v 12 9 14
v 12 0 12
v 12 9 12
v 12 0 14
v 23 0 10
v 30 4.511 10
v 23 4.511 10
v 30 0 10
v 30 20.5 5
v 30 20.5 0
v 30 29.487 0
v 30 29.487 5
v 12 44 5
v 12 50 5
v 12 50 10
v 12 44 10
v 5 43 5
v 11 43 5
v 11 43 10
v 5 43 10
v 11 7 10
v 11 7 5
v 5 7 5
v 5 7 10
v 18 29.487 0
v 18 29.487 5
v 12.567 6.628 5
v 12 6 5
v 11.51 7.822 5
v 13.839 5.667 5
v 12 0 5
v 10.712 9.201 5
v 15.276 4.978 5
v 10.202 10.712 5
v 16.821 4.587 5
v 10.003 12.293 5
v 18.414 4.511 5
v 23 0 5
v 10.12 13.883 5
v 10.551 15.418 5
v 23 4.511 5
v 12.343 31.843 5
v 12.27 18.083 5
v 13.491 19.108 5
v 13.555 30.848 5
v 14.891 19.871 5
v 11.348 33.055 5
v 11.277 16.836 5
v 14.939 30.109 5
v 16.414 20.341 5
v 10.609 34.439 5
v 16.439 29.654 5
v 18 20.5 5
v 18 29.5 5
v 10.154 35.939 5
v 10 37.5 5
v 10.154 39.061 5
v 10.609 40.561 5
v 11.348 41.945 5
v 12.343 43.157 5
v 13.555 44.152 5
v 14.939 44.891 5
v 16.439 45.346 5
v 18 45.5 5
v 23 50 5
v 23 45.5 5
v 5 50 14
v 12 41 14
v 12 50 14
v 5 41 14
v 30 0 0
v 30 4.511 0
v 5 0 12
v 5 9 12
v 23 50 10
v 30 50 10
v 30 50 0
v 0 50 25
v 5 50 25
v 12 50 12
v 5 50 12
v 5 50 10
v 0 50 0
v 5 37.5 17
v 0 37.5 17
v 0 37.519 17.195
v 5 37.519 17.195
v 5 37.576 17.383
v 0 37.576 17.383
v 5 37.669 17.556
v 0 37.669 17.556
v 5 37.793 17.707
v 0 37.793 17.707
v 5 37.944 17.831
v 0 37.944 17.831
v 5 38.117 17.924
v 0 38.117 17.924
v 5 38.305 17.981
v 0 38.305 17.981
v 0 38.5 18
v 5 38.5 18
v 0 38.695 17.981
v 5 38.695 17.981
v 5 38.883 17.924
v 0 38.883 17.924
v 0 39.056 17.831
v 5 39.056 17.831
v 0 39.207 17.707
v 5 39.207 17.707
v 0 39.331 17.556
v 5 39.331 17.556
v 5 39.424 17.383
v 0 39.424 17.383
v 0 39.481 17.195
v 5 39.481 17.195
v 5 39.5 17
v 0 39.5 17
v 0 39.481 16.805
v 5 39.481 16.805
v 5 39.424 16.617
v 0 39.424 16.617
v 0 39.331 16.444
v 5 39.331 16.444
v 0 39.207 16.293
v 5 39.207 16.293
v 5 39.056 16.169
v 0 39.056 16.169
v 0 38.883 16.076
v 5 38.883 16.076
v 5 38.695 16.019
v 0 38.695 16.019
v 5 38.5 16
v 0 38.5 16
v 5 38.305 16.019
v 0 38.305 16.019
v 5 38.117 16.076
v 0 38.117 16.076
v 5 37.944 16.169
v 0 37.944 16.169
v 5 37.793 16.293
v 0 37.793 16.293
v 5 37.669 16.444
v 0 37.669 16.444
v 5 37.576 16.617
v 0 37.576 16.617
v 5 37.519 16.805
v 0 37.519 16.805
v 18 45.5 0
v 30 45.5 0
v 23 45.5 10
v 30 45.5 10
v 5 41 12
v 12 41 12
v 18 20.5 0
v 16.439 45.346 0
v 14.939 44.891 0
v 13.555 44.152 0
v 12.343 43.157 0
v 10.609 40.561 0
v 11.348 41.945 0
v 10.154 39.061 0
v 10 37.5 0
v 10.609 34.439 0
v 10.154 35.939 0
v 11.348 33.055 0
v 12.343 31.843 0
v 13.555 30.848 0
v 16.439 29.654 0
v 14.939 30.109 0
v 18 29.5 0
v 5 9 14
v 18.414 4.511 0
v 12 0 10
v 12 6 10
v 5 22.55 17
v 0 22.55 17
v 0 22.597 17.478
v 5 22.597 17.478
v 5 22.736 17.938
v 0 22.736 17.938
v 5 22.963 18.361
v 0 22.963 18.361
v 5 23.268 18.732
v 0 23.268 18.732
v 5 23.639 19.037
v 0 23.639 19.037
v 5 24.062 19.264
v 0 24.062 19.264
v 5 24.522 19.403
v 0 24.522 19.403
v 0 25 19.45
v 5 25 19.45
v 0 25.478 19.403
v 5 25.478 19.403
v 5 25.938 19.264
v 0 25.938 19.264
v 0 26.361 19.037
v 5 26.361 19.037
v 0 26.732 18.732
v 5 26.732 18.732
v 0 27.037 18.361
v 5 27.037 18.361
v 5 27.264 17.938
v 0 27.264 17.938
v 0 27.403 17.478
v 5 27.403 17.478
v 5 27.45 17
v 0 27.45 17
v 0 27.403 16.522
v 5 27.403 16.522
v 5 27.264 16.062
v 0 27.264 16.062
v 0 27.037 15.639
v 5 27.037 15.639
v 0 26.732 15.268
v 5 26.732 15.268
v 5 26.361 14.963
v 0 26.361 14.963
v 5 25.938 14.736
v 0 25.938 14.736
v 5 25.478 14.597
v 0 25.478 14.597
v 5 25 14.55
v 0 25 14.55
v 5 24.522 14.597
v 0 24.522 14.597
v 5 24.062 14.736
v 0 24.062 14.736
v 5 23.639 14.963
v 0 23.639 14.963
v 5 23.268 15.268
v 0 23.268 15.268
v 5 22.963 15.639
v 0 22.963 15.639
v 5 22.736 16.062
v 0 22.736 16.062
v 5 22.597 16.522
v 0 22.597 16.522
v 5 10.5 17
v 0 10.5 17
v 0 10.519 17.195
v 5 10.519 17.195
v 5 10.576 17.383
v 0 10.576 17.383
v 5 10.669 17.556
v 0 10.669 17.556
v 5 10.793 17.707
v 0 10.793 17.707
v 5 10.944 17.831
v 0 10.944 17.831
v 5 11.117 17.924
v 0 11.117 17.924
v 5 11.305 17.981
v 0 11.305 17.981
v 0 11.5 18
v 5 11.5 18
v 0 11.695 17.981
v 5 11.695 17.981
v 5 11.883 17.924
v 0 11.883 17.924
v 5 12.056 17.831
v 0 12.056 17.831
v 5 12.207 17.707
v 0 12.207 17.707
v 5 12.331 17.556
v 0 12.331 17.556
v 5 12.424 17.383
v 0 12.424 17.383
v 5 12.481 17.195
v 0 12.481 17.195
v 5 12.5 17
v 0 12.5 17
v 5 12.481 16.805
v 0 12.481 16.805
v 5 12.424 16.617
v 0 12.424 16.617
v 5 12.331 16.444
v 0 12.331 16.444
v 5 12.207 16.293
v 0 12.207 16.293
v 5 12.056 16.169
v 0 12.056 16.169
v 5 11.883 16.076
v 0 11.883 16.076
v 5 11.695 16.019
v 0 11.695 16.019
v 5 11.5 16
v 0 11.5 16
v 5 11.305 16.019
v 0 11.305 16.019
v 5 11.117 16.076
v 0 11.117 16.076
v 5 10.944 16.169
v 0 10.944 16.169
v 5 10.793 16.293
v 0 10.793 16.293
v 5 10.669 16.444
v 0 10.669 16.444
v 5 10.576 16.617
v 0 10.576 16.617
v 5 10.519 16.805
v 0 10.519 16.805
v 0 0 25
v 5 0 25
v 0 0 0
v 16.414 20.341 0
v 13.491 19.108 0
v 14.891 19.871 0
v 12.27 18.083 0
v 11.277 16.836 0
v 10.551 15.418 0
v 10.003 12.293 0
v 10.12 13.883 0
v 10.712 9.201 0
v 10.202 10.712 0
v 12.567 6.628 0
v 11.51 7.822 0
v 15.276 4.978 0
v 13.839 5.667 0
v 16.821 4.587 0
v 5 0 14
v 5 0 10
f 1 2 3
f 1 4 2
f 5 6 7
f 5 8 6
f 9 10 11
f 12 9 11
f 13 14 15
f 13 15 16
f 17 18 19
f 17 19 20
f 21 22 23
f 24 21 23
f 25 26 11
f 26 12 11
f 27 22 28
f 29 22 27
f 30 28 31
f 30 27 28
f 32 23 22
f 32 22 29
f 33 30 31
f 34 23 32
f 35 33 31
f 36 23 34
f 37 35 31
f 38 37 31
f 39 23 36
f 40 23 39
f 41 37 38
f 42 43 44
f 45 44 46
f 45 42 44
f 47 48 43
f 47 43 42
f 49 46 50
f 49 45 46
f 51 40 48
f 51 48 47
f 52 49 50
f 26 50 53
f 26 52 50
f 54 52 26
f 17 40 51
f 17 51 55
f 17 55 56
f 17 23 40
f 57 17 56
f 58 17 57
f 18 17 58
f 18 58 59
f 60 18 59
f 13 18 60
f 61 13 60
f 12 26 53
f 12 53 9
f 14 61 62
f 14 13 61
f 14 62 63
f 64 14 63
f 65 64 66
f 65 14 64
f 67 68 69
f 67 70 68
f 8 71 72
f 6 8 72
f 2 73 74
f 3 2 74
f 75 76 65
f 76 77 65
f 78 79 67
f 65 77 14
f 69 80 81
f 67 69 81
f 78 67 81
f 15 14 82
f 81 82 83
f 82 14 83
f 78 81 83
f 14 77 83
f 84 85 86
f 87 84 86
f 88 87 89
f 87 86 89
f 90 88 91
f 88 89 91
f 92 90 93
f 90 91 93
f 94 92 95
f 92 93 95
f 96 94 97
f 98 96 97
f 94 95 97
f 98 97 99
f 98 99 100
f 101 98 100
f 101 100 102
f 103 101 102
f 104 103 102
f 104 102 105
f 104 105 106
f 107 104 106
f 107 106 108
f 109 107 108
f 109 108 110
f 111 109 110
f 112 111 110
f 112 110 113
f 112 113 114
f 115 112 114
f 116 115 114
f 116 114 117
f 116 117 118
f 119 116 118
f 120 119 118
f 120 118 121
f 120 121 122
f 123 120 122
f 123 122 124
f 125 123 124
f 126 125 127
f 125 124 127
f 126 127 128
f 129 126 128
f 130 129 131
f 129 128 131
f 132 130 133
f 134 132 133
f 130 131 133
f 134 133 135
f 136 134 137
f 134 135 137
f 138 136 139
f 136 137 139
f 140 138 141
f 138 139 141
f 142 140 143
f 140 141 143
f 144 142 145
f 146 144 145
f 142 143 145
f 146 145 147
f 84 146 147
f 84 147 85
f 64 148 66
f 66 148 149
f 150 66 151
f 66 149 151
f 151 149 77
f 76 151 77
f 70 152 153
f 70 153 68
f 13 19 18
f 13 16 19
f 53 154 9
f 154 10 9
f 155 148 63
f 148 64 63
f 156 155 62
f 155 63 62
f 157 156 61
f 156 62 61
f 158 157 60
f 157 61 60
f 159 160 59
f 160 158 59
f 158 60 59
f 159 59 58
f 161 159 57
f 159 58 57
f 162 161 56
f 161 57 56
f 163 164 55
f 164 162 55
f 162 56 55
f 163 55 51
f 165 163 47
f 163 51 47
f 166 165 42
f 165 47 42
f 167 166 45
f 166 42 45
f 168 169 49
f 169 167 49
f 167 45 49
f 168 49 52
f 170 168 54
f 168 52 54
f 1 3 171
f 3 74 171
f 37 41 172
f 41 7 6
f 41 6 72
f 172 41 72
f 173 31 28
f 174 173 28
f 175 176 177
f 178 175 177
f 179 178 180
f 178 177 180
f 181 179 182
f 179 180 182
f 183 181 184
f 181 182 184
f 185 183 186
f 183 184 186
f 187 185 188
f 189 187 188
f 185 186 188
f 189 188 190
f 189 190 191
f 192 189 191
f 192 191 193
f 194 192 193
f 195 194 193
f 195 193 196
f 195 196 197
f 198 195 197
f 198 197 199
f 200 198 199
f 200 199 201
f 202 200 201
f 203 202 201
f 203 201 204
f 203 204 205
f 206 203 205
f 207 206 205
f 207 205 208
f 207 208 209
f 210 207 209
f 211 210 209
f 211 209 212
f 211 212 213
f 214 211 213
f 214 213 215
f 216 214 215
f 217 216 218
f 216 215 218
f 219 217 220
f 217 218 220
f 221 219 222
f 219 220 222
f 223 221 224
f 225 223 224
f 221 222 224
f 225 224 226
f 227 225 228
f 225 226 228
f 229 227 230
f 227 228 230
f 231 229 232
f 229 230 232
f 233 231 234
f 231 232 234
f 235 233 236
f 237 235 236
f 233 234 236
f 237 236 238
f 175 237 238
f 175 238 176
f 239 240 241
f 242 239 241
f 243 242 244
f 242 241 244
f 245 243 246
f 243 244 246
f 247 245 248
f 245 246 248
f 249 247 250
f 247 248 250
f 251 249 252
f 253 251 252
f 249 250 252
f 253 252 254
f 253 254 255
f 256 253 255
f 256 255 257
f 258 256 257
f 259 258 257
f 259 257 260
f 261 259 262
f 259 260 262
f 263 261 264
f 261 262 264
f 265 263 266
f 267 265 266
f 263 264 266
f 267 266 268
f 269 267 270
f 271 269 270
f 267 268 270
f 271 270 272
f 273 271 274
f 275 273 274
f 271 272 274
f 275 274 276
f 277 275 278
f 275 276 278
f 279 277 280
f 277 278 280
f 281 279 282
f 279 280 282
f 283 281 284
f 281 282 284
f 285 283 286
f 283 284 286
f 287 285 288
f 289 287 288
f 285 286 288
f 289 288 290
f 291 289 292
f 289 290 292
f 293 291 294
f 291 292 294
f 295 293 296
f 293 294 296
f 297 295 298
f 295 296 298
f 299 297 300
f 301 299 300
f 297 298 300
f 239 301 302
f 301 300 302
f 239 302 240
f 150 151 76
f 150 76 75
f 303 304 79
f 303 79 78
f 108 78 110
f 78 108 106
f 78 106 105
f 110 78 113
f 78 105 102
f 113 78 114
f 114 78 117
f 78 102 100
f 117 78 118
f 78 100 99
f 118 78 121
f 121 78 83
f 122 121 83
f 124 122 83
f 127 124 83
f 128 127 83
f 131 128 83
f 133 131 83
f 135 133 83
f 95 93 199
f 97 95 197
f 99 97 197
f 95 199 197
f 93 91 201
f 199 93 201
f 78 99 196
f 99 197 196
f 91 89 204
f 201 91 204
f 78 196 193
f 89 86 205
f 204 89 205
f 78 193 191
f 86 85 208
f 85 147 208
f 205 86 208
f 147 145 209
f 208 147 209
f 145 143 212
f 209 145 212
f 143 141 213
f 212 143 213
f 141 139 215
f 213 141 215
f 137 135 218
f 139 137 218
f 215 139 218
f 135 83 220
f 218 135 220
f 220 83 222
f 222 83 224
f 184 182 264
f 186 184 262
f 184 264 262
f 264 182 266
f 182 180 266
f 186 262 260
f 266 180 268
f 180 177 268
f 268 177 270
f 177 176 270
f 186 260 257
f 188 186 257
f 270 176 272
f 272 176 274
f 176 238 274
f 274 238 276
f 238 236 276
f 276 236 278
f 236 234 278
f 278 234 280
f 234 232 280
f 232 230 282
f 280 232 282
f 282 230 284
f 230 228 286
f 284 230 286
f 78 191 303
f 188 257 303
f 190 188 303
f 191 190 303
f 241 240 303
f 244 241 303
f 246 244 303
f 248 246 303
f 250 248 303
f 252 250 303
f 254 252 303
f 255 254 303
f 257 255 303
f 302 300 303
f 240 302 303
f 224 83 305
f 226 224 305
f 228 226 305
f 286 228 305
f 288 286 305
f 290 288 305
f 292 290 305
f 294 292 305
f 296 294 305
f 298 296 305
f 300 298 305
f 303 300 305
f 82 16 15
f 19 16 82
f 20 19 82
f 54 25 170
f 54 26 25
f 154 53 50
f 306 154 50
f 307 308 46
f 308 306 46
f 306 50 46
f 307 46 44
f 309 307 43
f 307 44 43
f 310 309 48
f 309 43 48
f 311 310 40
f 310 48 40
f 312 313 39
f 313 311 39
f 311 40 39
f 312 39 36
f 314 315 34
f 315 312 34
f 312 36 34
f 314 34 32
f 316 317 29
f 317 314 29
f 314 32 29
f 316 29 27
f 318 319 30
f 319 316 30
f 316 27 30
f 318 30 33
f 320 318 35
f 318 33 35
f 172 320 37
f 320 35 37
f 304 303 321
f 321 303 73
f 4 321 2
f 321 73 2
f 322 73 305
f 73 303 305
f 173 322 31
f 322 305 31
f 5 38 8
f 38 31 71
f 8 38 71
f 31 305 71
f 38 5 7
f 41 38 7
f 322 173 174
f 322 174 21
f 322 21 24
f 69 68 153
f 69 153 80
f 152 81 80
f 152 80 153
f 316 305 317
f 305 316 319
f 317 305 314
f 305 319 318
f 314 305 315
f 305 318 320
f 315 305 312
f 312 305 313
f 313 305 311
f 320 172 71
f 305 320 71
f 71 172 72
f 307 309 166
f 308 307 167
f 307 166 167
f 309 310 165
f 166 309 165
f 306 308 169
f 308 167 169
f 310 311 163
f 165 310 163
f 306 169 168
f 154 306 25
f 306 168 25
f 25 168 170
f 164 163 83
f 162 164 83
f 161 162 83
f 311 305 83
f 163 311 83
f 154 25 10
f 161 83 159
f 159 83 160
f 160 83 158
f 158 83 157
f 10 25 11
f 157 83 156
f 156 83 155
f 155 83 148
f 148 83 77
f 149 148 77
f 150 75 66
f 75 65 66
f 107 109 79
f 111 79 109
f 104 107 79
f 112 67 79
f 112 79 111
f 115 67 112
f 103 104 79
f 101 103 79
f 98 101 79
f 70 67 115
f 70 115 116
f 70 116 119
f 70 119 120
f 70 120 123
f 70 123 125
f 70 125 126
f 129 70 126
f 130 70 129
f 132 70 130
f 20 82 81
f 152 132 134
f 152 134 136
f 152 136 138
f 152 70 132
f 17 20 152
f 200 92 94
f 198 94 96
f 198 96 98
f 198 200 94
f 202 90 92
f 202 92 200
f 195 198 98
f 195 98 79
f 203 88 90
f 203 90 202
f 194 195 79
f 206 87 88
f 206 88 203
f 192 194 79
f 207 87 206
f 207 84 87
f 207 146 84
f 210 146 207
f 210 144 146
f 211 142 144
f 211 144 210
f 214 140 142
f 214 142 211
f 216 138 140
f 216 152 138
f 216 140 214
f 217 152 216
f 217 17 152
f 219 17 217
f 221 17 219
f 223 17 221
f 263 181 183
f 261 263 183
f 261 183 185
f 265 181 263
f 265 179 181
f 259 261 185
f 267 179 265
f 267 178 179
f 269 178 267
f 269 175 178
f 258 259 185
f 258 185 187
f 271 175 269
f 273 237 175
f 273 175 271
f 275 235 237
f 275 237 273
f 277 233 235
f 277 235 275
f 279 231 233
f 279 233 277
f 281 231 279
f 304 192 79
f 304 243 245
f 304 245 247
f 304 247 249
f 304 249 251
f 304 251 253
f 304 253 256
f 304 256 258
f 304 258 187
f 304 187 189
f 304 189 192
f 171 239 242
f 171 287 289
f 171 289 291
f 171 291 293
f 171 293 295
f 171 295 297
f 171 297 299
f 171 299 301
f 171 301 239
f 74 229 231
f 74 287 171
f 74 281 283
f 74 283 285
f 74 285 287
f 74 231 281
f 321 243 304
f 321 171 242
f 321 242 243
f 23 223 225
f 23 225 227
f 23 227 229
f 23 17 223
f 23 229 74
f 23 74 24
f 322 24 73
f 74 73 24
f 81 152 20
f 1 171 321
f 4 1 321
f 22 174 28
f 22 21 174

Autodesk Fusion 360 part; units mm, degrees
sketch "Sketch1" plane through (0, 0, 0) normal (0, 0, 1) x (1, 0, 0)
  line L0 (0, 0) -> (30, 0)
  line L1 (30, 0) -> (30, 50)
  line L2 (30, 50) -> (0, 50)
  line L3 (0, 50) -> (0, 0)
  dimension "d1" = 30
  dimension "d2" = 50
extrude "Extrude1" add sketch "Sketch1" along normal blind 5
sketch "Sketch2" plane through (0, 0, 5) normal (0, 0, 1) x (-1, 0, 0)
  line L0 (0, -50) -> (0, 0)
  line L1 (0, 0) -> (-30, 0)
  line L2 (-30, 0) -> (-30, -50)
  line L3 (-30, -50) -> (0, -50)
  line L4 (0, -50) -> (-5, -50)
  line L5 (-5, -50) -> (-5, 0)
  line L6 (-5, 0) -> (0, 0)
  line L7 (0, 0) -> (0, -50)
extrude "Extrude2" add sketch "Sketch2" along normal blind 20 contours L0 L1 L3 L4 L5 L6 L7
sketch "Sketch3" plane through (0, 0, 5) normal (0, 0, 1) x (-1, 0, 0)
  line L0 (-5, -50) -> (-5, 0)
  line L1 (-5, 0) -> (-30, 0)
  line L2 (-30, 0) -> (-30, -50)
  line L3 (-30, -50) -> (-5, -50)
  line L4 (-30, 0) -> (-23, 0)
  line L5 (-23, 0) -> (-23, -7)
  line L6 (-23, -7) -> (-30, -7)
  line L7 (-30, -7) -> (-30, 0)
  line L8 (-30, -50) -> (-23, -50)
  line L9 (-23, -50) -> (-23, -43)
  line L10 (-23, -43) -> (-30, -43)
  line L11 (-30, -43) -> (-30, -50)
  line L12 (-5, -50) -> (-12, -50)
  line L13 (-12, -50) -> (-12, -43)
  line L14 (-12, -43) -> (-5, -43)
  line L15 (-5, -43) -> (-5, -50)
  line L16 (-5, 0) -> (-12, 0)
  line L17 (-12, 0) -> (-12, -7)
  line L18 (-12, -7) -> (-5, -7)
  line L19 (-5, -7) -> (-5, 0)
  circle A0 centre (-18, -12.5) radius 8
  circle A1 centre (-18, -37.5) radius 8
  dimension "d7" = 7
  dimension "d8" = 7
  dimension "d9" = 7
  dimension "d10" = 7
  dimension "d11" = 7
  dimension "d12" = 7
  dimension "d13" = 7
  dimension "d14" = 7
  dimension "d16" = 16
  dimension "d17" = 16
extrude "Extrude3" cut sketch "Sketch3" against normal blind 5 contours L9 L10 A1 | L5 L6 A0 picked at (-16.0576, -35.427) picked at (-16.0576, -14.573)
extrude "Extrude4" add sketch "Sketch3" along normal blind 5 contours L0 L3 L12 L13 L14 L15 | L0 L1 L16 L17 L18 L19 | L2 L3 L8 L9 L10 L11 A1 | L1 L2 L4 L5 L6 L7 A0
extrude "Extrude5" cut sketch "Sketch3" against normal blind 5 contours L9 L10 A1 | L5 L6 A0 picked at (-23.2774, -43.2566) picked at (-23.2774, -6.7434)
chamfer "Chamfer1" distance 1 angle 45 2 edges at (12, 7, 7.5) (12, 43, 7.5)
sketch "Sketch4" plane through (30, 0, 0) normal (1, 0, 0) x (0, 1, 0)
  line L0 (0, 0) -> (50, 0)
  line L1 (50, 0) -> (50, 10)
  line L2 (50, 10) -> (43, 10)
  line L3 (43, 10) -> (43, 5)
  line L4 (43, 5) -> (7, 5)
  line L5 (7, 5) -> (7, 10)
  line L6 (7, 10) -> (0, 10)
  line L7 (0, 10) -> (0, 0)
  line L8 (20.5, 5.0863) -> (4.5107, 5.0863)
  line L9 (4.5107, 5.0863) -> (4.5107, 0)
  line L10 (4.5107, 0) -> (20.5, 0)
  line L11 (20.5, 0) -> (20.5, 5.0863)
  line L12 (29.4867, 0) -> (45.5, 0)
  line L13 (45.5, 0) -> (45.5, 5.0968)
  line L14 (45.5, 5.0968) -> (29.4867, 5.0968)
  line L15 (29.4867, 5.0968) -> (29.4867, 0)
  line L16 (7, 10) -> (4.5107, 10)
  line L17 (4.5107, 10) -> (4.5107, 5.0863)
  line L18 (4.5107, 5.0863) -> (7, 5.0863)
  line L19 (7, 5.0863) -> (7, 10)
  line L20 (43, 10) -> (45.5, 10)
  line L21 (45.5, 10) -> (45.5, 5.0968)
  line L22 (45.5, 5.0968) -> (43, 5.0968)
  line L23 (43, 5.0968) -> (43, 10)
extrude "Extrude6" cut sketch "Sketch4" against normal blind 12 contours L0 L4 L5 L8 L9 L10 L11 L18 | L5 L6 L8 L16 L17 L18 L19 | L0 L3 L4 L12 L13 L14 L15 L22 | L2 L3 L14 L20 L21 L22 L23
sketch "Sketch5" plane through (0, 0, 0) normal (-1, 0, 0) x (0, -1, 0)
  line L0 (-50, 0) -> (0, 0)
  line L1 (0, 0) -> (0, 25)
  line L2 (0, 25) -> (-50, 25)
  line L3 (-50, 25) -> (-50, 0)
  circle A0 centre (-25, 17) radius 2.45
  circle A1 centre (-38.5, 17) radius 1
  circle A2 centre (-11.5, 17) radius 1
  dimension "d27" = 4.9
  dimension "d36" = 2
  dimension "d37" = 2
extrude "Extrude7" cut sketch "Sketch5" against normal blind 5 contours A0 | A1 | A2
sketch "Sketch6" plane through (5, 0, 0) normal (1, 0, 0) x (0, 1, 0)
  circle A0 centre (25, 17) radius 2.45
  line L0 (0, 10) -> (7, 10)
  line L1 (7, 10) -> (7, 5)
  line L2 (7, 5) -> (43, 5)
  line L3 (43, 5) -> (43, 10)
  line L4 (43, 10) -> (50, 10)
  line L5 (50, 10) -> (50, 25)
  line L6 (50, 25) -> (0, 25)
  line L7 (0, 25) -> (0, 10)
  line L8 (0, 12) -> (9, 12)
  line L9 (9, 12) -> (9, 14)
  line L10 (9, 14) -> (0, 14)
  line L11 (0, 14) -> (0, 12)
  line L12 (50, 12) -> (41, 12)
  line L13 (41, 12) -> (41, 14)
  line L14 (41, 14) -> (50, 14)
  line L15 (50, 14) -> (50, 12)
  circle A1 centre (11.5, 17) radius 1
  circle A2 centre (38.5, 17) radius 1
extrude "Extrude8" add sketch "Sketch6" along normal blind 7 contours L7 L8 L9 L10 L11 | L5 L12 L13 L14 L15
